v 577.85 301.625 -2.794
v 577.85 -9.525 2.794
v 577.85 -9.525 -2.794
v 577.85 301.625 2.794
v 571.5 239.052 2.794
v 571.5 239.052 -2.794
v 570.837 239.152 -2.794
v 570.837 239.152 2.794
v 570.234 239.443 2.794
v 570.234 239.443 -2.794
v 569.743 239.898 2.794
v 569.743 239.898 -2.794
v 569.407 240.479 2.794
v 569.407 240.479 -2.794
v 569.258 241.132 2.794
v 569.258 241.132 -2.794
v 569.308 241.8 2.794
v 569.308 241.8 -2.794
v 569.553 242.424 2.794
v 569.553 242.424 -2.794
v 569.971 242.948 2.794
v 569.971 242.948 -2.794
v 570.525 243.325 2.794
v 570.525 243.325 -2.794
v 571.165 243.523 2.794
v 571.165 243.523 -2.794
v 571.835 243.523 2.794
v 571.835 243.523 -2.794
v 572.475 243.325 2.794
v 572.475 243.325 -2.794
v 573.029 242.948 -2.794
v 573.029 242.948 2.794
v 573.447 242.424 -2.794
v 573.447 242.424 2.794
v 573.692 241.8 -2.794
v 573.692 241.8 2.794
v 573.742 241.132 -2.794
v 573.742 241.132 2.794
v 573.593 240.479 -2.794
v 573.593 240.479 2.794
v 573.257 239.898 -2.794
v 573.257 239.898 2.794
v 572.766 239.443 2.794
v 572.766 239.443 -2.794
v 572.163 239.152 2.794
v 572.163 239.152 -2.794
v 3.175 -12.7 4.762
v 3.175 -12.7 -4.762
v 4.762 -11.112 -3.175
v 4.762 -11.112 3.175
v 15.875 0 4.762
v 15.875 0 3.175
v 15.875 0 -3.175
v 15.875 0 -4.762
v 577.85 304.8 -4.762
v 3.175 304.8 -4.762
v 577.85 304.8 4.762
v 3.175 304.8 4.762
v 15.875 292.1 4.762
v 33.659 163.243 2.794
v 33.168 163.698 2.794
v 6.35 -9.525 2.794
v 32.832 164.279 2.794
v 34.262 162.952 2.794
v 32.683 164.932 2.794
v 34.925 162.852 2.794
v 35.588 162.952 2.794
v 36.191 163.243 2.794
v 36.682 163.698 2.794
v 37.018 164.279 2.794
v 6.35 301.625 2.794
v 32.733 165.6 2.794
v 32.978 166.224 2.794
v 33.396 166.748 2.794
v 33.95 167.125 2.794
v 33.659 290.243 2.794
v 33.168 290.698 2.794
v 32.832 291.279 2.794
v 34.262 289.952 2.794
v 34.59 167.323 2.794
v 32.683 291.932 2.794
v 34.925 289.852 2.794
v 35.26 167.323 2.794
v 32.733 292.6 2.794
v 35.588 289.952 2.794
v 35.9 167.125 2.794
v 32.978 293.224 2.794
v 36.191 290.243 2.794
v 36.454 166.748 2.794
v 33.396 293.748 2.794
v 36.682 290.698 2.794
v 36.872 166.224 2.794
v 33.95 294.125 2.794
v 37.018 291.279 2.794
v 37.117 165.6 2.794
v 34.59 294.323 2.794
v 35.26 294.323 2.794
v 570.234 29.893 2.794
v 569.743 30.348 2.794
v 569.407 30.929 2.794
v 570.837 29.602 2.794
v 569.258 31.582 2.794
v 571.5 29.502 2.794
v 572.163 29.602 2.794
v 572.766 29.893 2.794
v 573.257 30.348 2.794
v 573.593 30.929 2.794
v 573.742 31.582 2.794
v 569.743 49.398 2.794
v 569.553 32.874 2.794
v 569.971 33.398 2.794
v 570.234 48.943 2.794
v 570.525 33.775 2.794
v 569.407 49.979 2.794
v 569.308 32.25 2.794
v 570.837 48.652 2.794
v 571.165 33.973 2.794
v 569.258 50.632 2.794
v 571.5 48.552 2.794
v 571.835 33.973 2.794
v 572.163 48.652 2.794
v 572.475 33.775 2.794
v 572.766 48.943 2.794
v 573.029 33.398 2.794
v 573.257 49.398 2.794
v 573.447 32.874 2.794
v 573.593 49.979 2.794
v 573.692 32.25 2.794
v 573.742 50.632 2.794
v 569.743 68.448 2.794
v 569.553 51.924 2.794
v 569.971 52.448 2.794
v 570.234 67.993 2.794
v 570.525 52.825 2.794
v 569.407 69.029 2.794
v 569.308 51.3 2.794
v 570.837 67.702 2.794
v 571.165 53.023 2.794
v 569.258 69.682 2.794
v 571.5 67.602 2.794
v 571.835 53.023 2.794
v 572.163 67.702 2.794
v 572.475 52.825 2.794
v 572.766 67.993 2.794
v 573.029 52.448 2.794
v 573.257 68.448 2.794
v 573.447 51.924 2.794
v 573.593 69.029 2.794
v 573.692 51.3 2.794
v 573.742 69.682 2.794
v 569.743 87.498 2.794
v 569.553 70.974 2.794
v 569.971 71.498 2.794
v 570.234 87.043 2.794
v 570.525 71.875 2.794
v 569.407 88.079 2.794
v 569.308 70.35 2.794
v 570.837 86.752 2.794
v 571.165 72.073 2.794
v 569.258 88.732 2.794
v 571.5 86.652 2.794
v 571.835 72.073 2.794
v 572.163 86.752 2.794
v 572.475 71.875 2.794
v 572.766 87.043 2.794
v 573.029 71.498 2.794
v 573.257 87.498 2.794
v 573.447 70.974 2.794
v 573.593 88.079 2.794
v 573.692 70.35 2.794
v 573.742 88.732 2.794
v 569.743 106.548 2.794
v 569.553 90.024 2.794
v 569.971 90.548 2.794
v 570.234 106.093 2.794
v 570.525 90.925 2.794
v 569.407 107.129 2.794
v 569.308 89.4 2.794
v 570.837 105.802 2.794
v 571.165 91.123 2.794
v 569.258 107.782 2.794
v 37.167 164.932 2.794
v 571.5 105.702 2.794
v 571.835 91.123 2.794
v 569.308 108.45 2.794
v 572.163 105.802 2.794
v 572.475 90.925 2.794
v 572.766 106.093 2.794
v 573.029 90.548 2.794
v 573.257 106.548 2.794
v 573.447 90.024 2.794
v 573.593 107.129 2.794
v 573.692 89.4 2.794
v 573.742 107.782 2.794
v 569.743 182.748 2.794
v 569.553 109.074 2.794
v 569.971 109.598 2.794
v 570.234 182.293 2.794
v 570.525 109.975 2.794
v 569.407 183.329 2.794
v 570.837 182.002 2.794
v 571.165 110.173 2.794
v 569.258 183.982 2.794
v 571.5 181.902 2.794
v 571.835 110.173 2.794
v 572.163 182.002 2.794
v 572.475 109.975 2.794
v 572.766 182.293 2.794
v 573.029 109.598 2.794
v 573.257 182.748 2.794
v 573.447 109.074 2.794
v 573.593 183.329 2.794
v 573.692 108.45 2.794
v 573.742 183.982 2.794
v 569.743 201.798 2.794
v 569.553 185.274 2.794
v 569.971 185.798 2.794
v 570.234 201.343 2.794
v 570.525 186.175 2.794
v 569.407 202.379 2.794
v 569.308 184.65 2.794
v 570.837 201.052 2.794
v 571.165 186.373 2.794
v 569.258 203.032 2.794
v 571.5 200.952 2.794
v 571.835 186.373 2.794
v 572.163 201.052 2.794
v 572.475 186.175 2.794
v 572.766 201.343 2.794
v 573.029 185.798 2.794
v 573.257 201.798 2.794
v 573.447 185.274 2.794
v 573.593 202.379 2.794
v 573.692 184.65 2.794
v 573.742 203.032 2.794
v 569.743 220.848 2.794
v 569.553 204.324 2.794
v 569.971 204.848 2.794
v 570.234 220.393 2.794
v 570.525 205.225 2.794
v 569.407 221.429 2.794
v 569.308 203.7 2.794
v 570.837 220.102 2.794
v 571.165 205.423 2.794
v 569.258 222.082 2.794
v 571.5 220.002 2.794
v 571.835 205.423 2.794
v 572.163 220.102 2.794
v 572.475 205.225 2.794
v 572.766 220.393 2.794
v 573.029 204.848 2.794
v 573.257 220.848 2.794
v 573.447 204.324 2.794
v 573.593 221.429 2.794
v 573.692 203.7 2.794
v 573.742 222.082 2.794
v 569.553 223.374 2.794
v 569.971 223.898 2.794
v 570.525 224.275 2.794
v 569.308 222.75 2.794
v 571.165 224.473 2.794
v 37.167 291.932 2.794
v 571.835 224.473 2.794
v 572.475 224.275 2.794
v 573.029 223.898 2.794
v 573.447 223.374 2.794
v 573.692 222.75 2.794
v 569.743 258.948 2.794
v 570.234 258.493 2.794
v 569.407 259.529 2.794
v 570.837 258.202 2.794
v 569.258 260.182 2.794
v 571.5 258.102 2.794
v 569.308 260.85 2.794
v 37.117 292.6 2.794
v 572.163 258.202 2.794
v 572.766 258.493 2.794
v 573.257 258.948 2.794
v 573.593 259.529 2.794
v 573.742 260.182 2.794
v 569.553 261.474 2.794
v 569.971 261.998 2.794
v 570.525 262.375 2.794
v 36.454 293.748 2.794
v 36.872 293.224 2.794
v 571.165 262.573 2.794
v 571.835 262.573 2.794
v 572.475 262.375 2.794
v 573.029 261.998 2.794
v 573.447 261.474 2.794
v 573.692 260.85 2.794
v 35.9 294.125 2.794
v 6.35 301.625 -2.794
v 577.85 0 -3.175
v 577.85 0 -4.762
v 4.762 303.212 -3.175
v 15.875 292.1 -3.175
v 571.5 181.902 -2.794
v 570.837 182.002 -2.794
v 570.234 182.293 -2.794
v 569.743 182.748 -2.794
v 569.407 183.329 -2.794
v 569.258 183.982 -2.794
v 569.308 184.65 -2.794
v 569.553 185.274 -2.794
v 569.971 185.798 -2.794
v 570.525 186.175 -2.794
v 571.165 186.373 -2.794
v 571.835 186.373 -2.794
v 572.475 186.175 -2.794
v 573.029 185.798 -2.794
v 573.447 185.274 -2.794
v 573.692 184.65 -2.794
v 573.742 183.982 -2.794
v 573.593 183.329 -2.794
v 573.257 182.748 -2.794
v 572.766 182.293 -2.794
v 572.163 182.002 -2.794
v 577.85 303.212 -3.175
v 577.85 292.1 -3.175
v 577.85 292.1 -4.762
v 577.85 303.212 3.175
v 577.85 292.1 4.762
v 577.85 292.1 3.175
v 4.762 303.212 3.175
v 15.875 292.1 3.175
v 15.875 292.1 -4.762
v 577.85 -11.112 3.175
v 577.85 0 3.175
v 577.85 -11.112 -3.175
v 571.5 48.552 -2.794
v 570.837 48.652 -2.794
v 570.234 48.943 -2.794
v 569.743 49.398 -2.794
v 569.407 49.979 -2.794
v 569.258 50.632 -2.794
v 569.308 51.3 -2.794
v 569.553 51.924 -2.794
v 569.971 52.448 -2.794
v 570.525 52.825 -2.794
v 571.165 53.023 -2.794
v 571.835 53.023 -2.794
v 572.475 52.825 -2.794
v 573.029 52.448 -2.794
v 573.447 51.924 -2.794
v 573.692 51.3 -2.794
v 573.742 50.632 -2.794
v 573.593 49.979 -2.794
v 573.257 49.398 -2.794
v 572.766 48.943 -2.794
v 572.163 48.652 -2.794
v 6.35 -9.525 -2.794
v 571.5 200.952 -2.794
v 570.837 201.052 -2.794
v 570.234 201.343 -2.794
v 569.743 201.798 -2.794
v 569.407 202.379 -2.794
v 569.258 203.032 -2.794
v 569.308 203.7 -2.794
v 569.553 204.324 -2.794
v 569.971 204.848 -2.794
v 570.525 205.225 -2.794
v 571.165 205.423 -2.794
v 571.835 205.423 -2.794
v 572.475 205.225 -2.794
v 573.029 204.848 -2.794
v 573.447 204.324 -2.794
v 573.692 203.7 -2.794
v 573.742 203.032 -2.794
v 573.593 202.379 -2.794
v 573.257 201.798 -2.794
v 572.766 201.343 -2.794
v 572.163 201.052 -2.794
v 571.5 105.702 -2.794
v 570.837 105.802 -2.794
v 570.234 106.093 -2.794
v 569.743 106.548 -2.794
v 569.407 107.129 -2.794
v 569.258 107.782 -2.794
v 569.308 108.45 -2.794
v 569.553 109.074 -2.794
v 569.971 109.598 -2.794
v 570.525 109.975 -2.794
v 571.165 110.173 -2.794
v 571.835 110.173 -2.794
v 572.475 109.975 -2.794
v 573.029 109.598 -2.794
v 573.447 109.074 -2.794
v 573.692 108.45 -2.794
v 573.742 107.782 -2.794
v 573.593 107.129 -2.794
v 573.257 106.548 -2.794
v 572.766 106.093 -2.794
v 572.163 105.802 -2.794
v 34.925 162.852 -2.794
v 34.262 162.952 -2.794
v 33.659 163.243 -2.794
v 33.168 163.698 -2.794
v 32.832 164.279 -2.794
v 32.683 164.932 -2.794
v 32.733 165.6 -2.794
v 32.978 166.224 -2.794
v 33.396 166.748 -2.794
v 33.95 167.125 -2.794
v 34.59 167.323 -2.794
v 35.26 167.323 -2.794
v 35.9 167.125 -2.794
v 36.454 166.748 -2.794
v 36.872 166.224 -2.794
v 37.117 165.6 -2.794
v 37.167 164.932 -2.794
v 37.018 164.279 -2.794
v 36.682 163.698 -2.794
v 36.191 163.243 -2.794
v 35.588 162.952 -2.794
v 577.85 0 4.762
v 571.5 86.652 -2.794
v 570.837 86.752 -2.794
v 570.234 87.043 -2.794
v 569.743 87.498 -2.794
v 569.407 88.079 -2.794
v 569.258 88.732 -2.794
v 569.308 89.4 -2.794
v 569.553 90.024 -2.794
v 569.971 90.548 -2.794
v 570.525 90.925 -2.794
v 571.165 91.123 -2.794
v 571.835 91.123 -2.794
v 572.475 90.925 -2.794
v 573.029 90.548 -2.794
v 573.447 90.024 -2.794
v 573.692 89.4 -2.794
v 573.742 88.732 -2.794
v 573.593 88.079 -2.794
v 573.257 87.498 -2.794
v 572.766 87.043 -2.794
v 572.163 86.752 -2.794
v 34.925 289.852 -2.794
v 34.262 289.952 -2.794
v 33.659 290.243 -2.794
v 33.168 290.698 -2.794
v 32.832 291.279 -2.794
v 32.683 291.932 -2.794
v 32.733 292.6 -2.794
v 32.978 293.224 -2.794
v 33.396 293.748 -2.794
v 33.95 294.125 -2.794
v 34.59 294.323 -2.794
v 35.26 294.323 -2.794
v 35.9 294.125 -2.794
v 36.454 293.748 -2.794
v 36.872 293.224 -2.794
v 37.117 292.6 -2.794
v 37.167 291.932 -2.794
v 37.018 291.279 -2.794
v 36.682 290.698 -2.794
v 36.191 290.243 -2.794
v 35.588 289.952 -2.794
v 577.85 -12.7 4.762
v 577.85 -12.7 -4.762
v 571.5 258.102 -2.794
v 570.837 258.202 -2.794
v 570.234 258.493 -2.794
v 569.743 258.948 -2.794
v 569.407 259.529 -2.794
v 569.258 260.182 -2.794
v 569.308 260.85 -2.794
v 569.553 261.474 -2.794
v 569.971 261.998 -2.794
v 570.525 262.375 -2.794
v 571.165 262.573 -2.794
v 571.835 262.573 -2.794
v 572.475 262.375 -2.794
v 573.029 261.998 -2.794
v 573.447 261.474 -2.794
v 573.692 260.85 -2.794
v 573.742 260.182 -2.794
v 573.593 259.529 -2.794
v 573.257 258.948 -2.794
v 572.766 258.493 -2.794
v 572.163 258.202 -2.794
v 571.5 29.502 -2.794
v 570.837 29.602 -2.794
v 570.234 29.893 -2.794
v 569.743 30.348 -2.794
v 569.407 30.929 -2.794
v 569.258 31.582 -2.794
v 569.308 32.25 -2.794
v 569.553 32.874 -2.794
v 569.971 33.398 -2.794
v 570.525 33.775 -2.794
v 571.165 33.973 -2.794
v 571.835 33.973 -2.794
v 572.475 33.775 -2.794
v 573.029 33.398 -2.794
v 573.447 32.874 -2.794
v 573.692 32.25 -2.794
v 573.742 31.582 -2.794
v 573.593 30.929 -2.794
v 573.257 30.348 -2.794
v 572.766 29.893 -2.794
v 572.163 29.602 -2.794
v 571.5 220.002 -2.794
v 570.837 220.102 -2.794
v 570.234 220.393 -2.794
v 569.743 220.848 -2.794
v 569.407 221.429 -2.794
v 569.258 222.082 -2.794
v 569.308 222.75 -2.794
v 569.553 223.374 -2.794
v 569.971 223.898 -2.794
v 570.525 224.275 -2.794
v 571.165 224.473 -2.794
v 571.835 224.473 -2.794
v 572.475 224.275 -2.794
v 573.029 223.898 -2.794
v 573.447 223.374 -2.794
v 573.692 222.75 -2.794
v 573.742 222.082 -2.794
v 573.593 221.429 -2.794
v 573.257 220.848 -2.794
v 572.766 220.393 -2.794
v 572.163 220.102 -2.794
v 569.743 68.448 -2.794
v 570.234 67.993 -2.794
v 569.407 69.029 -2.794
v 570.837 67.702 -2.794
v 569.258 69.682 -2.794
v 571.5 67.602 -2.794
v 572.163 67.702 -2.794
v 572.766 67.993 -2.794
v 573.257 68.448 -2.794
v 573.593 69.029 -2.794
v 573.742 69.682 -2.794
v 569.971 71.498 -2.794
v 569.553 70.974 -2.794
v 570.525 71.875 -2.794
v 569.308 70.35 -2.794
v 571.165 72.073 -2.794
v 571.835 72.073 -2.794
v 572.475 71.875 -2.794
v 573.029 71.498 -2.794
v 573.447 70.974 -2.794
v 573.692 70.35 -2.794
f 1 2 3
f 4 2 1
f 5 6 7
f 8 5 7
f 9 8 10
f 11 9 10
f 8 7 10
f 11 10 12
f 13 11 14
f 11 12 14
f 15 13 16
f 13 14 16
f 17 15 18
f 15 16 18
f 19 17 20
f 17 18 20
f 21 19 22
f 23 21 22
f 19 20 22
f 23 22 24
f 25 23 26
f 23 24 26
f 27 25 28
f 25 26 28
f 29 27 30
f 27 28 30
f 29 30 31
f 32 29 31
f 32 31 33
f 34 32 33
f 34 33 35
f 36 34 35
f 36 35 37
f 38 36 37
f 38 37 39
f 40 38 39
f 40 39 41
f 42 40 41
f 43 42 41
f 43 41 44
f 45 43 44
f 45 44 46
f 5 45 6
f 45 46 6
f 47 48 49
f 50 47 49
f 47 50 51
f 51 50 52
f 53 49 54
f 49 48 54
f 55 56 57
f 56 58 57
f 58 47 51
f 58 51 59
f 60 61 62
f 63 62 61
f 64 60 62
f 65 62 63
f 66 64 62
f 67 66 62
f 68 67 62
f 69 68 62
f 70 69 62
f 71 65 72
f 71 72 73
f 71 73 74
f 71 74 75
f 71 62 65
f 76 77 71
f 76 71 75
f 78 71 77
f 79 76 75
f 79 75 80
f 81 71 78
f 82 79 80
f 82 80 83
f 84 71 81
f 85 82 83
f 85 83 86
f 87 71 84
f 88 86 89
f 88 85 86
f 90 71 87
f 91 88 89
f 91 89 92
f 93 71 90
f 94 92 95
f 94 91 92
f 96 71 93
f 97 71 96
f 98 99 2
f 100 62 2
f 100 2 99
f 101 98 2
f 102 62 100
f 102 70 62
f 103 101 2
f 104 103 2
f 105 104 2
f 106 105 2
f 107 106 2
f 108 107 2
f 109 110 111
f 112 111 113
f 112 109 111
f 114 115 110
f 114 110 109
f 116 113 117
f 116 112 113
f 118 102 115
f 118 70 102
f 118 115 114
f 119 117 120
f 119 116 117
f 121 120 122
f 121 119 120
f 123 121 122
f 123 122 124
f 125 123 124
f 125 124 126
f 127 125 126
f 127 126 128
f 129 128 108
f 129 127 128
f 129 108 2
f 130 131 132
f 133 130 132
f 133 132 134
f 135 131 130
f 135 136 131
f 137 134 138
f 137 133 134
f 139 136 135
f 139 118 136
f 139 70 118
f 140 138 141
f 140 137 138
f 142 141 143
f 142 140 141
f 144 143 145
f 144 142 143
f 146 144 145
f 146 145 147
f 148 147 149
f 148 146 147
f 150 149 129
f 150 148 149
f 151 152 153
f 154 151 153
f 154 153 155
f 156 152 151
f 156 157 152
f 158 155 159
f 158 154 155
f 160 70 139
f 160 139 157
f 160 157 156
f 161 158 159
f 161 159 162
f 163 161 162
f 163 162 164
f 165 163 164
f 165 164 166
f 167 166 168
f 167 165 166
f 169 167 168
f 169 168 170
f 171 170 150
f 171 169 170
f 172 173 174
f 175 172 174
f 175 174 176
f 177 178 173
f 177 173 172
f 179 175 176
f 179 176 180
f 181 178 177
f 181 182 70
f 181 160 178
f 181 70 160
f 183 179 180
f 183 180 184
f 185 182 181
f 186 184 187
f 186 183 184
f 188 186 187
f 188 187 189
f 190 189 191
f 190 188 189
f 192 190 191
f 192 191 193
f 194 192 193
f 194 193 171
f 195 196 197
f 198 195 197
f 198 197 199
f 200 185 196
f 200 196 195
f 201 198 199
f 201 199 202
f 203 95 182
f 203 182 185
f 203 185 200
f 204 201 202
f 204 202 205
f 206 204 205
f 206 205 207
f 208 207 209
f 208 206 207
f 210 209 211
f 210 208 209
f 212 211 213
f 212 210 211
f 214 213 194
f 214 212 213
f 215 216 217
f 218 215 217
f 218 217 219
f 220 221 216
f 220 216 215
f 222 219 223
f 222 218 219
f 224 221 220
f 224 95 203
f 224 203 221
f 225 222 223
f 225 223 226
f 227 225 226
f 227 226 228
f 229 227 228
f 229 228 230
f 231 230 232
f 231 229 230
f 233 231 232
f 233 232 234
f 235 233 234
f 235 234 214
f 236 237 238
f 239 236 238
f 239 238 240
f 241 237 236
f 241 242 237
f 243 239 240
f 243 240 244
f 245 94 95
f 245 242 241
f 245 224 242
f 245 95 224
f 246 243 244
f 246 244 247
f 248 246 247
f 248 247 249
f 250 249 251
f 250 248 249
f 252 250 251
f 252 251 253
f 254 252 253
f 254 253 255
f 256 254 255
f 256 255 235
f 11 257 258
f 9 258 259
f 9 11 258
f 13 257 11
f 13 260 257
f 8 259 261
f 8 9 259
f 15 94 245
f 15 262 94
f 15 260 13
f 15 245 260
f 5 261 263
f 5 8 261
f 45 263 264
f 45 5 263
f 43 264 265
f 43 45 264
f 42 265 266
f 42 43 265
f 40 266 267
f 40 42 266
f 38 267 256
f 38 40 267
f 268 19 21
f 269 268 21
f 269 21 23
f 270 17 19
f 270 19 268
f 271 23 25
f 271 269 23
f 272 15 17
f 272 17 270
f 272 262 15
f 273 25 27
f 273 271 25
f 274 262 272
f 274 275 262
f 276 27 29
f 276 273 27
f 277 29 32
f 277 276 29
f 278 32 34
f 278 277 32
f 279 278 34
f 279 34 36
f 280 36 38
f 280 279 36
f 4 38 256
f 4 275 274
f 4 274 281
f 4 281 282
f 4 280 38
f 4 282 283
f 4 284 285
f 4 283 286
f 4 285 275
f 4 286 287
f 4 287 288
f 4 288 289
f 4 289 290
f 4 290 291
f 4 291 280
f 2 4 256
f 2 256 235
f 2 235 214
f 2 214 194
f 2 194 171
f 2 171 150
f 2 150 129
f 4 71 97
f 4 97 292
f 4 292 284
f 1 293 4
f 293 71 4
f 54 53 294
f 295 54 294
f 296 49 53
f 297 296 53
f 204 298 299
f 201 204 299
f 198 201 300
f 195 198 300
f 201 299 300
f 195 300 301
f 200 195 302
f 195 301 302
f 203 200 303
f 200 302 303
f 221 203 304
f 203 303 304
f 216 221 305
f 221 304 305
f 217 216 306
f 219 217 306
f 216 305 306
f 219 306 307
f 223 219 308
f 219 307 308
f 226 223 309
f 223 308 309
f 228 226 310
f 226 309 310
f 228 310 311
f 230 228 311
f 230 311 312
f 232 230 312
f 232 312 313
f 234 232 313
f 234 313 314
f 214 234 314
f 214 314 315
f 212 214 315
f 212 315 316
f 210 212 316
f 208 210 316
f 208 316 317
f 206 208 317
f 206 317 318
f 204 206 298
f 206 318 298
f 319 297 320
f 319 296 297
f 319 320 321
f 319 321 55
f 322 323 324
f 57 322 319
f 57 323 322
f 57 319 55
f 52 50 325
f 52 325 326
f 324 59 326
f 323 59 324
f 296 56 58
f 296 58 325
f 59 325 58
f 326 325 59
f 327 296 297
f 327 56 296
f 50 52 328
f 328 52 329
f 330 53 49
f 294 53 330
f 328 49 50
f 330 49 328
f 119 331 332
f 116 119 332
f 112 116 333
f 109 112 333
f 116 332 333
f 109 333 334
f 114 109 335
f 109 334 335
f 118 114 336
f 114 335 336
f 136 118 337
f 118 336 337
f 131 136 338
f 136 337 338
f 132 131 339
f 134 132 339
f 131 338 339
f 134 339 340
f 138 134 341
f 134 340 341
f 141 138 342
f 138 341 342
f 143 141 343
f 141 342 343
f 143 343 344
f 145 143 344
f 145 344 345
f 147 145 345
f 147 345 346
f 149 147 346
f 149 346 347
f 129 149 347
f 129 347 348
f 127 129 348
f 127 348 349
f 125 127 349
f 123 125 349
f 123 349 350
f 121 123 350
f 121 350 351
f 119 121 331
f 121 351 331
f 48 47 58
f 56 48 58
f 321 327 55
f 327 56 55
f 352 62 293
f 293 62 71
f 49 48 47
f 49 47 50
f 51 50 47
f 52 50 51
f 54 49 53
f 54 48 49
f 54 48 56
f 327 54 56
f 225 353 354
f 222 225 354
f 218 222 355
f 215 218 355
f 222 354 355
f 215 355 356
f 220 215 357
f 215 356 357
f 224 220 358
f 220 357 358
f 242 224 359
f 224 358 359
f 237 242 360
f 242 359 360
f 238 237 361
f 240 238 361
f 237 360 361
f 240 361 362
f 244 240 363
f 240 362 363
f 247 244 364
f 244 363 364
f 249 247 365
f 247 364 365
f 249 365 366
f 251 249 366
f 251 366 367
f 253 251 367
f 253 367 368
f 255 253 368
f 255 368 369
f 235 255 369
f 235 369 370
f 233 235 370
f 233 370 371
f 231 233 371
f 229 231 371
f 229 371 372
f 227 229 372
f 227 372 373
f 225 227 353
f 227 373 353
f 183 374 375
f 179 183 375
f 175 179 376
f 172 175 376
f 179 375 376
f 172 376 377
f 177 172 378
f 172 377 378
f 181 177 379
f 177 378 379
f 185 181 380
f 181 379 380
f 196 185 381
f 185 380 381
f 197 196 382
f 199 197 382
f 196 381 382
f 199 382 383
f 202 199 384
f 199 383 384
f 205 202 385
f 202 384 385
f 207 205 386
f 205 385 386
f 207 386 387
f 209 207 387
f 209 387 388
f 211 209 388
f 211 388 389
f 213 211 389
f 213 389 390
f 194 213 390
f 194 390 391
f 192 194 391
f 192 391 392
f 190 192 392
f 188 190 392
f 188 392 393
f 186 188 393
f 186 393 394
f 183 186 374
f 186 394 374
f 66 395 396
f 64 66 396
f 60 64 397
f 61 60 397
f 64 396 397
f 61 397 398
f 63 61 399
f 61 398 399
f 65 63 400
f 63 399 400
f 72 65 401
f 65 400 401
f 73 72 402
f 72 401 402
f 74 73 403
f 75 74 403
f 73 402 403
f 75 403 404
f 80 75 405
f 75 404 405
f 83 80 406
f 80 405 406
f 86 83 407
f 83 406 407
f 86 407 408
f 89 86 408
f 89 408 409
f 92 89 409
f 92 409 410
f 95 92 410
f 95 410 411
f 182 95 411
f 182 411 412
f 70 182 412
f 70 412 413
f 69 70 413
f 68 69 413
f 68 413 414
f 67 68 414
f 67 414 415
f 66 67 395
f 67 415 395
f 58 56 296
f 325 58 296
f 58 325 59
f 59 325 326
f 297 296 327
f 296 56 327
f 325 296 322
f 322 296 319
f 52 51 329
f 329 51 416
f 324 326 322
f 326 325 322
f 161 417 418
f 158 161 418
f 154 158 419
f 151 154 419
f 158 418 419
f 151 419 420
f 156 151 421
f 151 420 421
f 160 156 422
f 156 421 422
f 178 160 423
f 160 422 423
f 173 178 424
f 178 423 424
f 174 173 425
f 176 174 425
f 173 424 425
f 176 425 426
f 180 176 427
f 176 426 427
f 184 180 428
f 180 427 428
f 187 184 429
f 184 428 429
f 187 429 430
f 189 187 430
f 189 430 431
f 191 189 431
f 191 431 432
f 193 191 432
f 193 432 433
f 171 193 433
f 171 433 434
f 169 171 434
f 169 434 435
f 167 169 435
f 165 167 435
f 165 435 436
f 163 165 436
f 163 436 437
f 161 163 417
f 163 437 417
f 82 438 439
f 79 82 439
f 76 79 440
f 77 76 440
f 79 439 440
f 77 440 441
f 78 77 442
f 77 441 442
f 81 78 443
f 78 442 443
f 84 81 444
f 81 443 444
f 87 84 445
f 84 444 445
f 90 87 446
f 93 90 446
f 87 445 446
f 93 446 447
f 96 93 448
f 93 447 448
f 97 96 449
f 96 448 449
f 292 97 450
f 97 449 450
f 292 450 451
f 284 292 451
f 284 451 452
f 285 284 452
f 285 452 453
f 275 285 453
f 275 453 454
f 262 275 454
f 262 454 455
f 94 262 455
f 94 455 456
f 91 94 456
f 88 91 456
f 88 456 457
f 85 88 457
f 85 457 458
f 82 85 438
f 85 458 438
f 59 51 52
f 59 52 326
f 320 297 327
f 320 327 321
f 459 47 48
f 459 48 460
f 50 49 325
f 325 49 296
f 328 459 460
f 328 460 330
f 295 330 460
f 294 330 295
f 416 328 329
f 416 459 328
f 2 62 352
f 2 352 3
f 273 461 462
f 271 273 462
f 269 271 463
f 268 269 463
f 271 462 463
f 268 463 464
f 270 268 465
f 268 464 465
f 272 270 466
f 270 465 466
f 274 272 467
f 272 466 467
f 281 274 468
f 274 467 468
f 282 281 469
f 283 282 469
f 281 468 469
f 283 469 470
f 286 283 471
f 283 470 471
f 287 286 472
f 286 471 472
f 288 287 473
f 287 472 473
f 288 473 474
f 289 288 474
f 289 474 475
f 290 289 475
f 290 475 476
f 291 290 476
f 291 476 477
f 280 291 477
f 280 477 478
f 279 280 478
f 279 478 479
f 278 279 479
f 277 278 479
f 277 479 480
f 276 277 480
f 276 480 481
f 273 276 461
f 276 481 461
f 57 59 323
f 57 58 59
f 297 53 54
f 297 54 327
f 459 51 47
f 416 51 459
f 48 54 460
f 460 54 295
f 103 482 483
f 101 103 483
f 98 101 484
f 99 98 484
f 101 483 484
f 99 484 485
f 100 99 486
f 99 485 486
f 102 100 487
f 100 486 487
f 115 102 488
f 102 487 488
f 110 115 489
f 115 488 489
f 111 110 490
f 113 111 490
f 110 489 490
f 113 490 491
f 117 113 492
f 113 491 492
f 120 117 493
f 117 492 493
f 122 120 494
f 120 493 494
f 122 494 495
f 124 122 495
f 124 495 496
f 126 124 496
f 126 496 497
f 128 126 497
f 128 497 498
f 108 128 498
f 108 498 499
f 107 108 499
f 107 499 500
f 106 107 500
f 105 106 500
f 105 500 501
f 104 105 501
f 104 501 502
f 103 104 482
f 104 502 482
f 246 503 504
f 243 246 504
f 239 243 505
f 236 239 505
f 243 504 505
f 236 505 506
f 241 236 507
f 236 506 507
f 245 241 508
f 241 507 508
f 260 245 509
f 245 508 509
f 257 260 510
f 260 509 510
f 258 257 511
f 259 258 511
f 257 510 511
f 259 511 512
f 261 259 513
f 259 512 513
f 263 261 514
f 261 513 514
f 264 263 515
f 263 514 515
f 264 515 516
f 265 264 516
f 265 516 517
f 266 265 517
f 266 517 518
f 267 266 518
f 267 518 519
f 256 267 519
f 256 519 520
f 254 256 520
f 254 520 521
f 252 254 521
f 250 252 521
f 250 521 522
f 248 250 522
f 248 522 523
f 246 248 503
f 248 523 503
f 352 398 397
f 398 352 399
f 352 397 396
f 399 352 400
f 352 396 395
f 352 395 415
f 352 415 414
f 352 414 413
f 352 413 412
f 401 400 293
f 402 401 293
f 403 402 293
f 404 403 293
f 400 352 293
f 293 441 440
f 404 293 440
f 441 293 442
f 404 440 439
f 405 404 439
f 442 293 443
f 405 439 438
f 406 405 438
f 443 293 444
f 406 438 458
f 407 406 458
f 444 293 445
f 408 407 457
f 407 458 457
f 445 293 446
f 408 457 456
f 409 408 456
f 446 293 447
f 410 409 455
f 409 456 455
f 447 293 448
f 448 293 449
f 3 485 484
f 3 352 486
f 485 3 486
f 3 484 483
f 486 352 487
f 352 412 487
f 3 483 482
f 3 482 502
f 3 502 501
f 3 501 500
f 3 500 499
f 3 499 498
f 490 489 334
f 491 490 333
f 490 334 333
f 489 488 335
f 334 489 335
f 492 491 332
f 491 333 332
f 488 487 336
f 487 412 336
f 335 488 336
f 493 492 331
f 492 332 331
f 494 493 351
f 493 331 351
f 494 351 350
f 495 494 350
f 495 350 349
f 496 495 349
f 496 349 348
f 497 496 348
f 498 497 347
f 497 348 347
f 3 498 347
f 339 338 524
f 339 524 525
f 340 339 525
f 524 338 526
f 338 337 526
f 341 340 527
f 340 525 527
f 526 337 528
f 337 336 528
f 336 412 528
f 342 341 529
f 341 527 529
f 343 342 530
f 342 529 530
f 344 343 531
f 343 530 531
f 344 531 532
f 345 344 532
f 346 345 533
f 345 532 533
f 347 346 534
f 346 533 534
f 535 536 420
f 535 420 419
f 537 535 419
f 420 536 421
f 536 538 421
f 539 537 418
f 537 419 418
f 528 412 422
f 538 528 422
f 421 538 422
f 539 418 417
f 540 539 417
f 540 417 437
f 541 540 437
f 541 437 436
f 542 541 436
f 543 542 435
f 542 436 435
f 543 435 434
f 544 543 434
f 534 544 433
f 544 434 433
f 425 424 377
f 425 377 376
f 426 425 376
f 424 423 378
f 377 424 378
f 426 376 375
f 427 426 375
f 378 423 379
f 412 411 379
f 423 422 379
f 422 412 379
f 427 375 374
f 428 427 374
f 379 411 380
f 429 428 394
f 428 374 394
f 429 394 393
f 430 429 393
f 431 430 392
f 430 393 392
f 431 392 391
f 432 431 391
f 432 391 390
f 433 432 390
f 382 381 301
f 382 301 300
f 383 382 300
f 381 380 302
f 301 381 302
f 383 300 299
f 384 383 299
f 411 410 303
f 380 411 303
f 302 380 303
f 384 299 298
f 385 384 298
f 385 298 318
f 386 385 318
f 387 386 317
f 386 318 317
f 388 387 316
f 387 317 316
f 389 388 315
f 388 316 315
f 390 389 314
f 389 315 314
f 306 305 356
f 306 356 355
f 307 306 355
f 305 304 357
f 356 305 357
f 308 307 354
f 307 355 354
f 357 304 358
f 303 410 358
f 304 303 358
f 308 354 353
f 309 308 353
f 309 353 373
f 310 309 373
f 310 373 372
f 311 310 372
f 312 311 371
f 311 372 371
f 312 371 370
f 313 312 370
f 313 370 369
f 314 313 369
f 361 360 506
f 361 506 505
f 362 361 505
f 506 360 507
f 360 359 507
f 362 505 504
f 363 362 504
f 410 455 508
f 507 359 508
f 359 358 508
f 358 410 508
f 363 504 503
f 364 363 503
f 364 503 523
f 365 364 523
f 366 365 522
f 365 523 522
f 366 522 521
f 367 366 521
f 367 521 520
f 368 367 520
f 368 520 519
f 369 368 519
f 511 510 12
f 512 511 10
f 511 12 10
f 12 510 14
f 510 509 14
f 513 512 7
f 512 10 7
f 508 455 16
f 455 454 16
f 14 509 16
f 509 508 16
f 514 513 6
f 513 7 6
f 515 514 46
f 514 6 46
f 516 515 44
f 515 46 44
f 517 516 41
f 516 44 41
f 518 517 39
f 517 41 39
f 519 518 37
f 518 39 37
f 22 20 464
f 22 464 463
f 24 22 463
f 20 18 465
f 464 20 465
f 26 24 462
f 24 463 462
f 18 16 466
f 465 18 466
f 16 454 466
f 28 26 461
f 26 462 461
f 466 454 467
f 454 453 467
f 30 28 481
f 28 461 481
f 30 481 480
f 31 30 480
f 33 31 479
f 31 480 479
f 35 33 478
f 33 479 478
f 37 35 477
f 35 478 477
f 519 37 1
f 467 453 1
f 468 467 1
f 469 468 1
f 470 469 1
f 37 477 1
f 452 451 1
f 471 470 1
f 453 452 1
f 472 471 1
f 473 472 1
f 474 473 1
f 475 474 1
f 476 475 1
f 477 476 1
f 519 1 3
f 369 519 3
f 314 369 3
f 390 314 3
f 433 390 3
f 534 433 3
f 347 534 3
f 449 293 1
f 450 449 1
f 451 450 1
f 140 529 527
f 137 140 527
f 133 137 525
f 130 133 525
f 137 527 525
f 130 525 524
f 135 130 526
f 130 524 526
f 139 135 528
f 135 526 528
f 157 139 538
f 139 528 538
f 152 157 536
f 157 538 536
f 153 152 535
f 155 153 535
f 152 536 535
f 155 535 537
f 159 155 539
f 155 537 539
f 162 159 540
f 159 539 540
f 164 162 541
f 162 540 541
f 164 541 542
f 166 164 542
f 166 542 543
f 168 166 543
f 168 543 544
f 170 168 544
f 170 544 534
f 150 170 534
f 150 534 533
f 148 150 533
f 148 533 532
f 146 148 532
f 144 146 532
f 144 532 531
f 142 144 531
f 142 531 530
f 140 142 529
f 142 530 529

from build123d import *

# Parameters (mm, degrees)
SKETCH2_W                             = 574.675
SKETCH2_H                             = 317.5
FRAME_OUTER_DIMENSIONS_DEPTH          = 4.7625
SKETCH3_W                             = 561.975
SKETCH3_H                             = 292.1
FRAME_INNER_DIMENSIONS_DEPTH          = 654.379206989
FRAME_PROFILE_DEPTH                   = 3.175
FRAME_PROFILE_DEPTH_BACK              = 3.175
SKETCH4_W                             = 573.0875
SKETCH4_H                             = 314.325
FRAME_SECTION_SPLIT_SURFACE_1_1_BACK  = 657.619
FRAME_SECTION_SPLIT_SURFACE_1_1_DEPTH = 1315.238
FRAME_SECTION_SPLIT_SURFACE_1_2_BACK  = 657.619
FRAME_SECTION_SPLIT_SURFACE_1_2_DEPTH = 1315.238
FRAME_SECTION_SPLIT_SURFACE_2_3_BACK  = 657.619
FRAME_SECTION_SPLIT_SURFACE_2_3_DEPTH = 1315.238
FRAME_SECTION_SPLIT_SURFACE_2_4_BACK  = 657.619
FRAME_SECTION_SPLIT_SURFACE_2_4_DEPTH = 1315.238
SKETCH5_W                             = 571.5
SKETCH5_H                             = 311.15
DOOR_PANEL_DEPTH                      = 2.794
SKETCH9_W                             = 2.2479
SKETCH9_H                             = 7.5565
F_8_CLEARANCE_HOLE1_AT_2_COUNT        = 2
F_8_CLEARANCE_HOLE1_AT_2_PITCH        = 19.05
F_8_CLEARANCE_HOLE1_AT_3_COUNT        = 2
F_8_CLEARANCE_HOLE1_AT_3_PITCH        = 38.1
F_8_CLEARANCE_HOLE1_AT_4_COUNT        = 2
F_8_CLEARANCE_HOLE1_AT_4_PITCH        = 57.15
F_8_CLEARANCE_HOLE1_AT_5_COUNT        = 2
F_8_CLEARANCE_HOLE1_AT_5_PITCH        = 76.2
F_8_CLEARANCE_HOLE1_AT_6_COUNT        = 2
F_8_CLEARANCE_HOLE1_AT_6_PITCH        = 171.45
F_8_CLEARANCE_HOLE1_AT_7_COUNT        = 2
F_8_CLEARANCE_HOLE1_AT_7_PITCH        = 190.5
F_8_CLEARANCE_HOLE1_AT_8_COUNT        = 2
F_8_CLEARANCE_HOLE1_AT_8_PITCH        = 209.55
F_8_CLEARANCE_HOLE1_AT_9_COUNT        = 2
F_8_CLEARANCE_HOLE1_AT_9_PITCH        = 228.6
F_8_CLEARANCE_HOLE1_AT_10_COUNT       = 2
F_8_CLEARANCE_HOLE1_AT_10_PITCH       = 152.4
SKETCH12_W                            = 2.2479
SKETCH12_H                            = 7.5565
F_8_CLEARANCE_HOLE2_AT_2_COUNT        = 2
F_8_CLEARANCE_HOLE2_AT_2_PITCH        = 127


with BuildPart() as part:
    # Sketch2 → Frame outer dimensions (new, symmetric)
    with BuildSketch(Plane.XY):
        with Locations((290.5125, 146.05)):
            Rectangle(SKETCH2_W, SKETCH2_H)
    extrude(amount=FRAME_OUTER_DIMENSIONS_DEPTH, both=True)

    # Sketch3 → Frame inner dimensions (cut, through all)
    with BuildSketch(Plane.XY.offset(4.7625)):
        with Locations((296.8625, 146.05)):
            Rectangle(SKETCH3_W, SKETCH3_H)
    extrude(amount=-FRAME_INNER_DIMENSIONS_DEPTH, mode=Mode.SUBTRACT)

    # Sketch4 → Frame profile (cut, two sides: drawn at the far end of the back side and taken through both)
    with BuildSketch(Plane.XY.offset(-FRAME_PROFILE_DEPTH_BACK)):
        with Locations((291.30625, 146.05)):
            Rectangle(SKETCH4_W, SKETCH4_H)
    extrude(amount=FRAME_PROFILE_DEPTH + FRAME_PROFILE_DEPTH_BACK, mode=Mode.SUBTRACT)


with BuildPart() as body_2:
    # Frame section split: the piece behind the surface
    add(part.part)
    # Frame section split surface 1: a surface, the sketch's curves swept straight by 1315.238 mm
    with BuildLine(Plane.XY.offset(4.7625).offset(-FRAME_SECTION_SPLIT_SURFACE_1_1_BACK), mode=Mode.PRIVATE) as frame_section_split_surface_1_1_path:
        Line((3.175, 304.8), (15.875, 292.1))
    frame_section_split_surface_1_1 = Shell.extrude(frame_section_split_surface_1_1_path.wire(), (0 * FRAME_SECTION_SPLIT_SURFACE_1_1_DEPTH, 0 * FRAME_SECTION_SPLIT_SURFACE_1_1_DEPTH, 1 * FRAME_SECTION_SPLIT_SURFACE_1_1_DEPTH))
    split(bisect_by=frame_section_split_surface_1_1, keep=Keep.BOTTOM)


with BuildPart() as part_1:
    add(part.part)

    # Frame section split: split by a surface, the side it looks to stays
    # Frame section split surface 1: a surface, the sketch's curves swept straight by 1315.238 mm
    with BuildLine(Plane.XY.offset(4.7625).offset(-FRAME_SECTION_SPLIT_SURFACE_1_2_BACK), mode=Mode.PRIVATE) as frame_section_split_surface_1_2_path:
        Line((3.175, 304.8), (15.875, 292.1))
    frame_section_split_surface_1_2 = Shell.extrude(frame_section_split_surface_1_2_path.wire(), (0 * FRAME_SECTION_SPLIT_SURFACE_1_2_DEPTH, 0 * FRAME_SECTION_SPLIT_SURFACE_1_2_DEPTH, 1 * FRAME_SECTION_SPLIT_SURFACE_1_2_DEPTH))
    split(bisect_by=frame_section_split_surface_1_2, keep=Keep.TOP)


with BuildPart() as body_3:
    # Frame section split 2 body 2: the piece behind the surface
    add(body_2.part)
    # Frame section split surface 2: a surface, the sketch's curves swept straight by 1315.238 mm
    with BuildLine(Plane.XY.offset(4.7625).offset(-FRAME_SECTION_SPLIT_SURFACE_2_3_BACK), mode=Mode.PRIVATE) as frame_section_split_surface_2_3_path:
        Line((3.175, -12.7), (15.875, 0))
    frame_section_split_surface_2_3 = Shell.extrude(frame_section_split_surface_2_3_path.wire(), (0 * FRAME_SECTION_SPLIT_SURFACE_2_3_DEPTH, 0 * FRAME_SECTION_SPLIT_SURFACE_2_3_DEPTH, 1 * FRAME_SECTION_SPLIT_SURFACE_2_3_DEPTH))
    split(bisect_by=frame_section_split_surface_2_3, keep=Keep.BOTTOM)


with BuildPart() as body_2_1:
    add(body_2.part)

    # Frame section split 2 body 2: split by a surface, the side it looks to stays
    # Frame section split surface 2: a surface, the sketch's curves swept straight by 1315.238 mm
    with BuildLine(Plane.XY.offset(4.7625).offset(-FRAME_SECTION_SPLIT_SURFACE_2_4_BACK), mode=Mode.PRIVATE) as frame_section_split_surface_2_4_path:
        Line((3.175, -12.7), (15.875, 0))
    frame_section_split_surface_2_4 = Shell.extrude(frame_section_split_surface_2_4_path.wire(), (0 * FRAME_SECTION_SPLIT_SURFACE_2_4_DEPTH, 0 * FRAME_SECTION_SPLIT_SURFACE_2_4_DEPTH, 1 * FRAME_SECTION_SPLIT_SURFACE_2_4_DEPTH))
    split(bisect_by=frame_section_split_surface_2_4, keep=Keep.TOP)


with BuildPart() as body_4:
    # Sketch5 → Door panel (new, symmetric)
    with BuildSketch(Plane.XY):
        with Locations((292.1, 146.05)):
            Rectangle(SKETCH5_W, SKETCH5_H)
    extrude(amount=DOOR_PANEL_DEPTH, both=True)

    # Sketch9 → #8 Clearance Hole1 (revolve, cut)
    with BuildSketch(Plane(origin=(571.5, 31.75, 2.794), x_dir=(0, -1, 0), z_dir=(1, 0, 0))):
        with Locations((1.12395, 3.77825)):
            Rectangle(SKETCH9_W, SKETCH9_H)
    f_8_clearance_hole1 = revolve(axis=Axis((571.5, 31.75, 9.144), (0, 0, -1)), mode=Mode.SUBTRACT)

    # #8 Clearance Hole1 at 2: #8 Clearance Hole1 ×2
    with Locations(*[(0, i * F_8_CLEARANCE_HOLE1_AT_2_PITCH, 0) for i in range(1, F_8_CLEARANCE_HOLE1_AT_2_COUNT)]):
        add(f_8_clearance_hole1, mode=Mode.SUBTRACT)

    # #8 Clearance Hole1 at 3: #8 Clearance Hole1 ×2
    with Locations(*[(0, i * F_8_CLEARANCE_HOLE1_AT_3_PITCH, 0) for i in range(1, F_8_CLEARANCE_HOLE1_AT_3_COUNT)]):
        add(f_8_clearance_hole1, mode=Mode.SUBTRACT)

    # #8 Clearance Hole1 at 4: #8 Clearance Hole1 ×2
    with Locations(*[(0, i * F_8_CLEARANCE_HOLE1_AT_4_PITCH, 0) for i in range(1, F_8_CLEARANCE_HOLE1_AT_4_COUNT)]):
        add(f_8_clearance_hole1, mode=Mode.SUBTRACT)

    # #8 Clearance Hole1 at 5: #8 Clearance Hole1 ×2
    with Locations(*[(0, i * F_8_CLEARANCE_HOLE1_AT_5_PITCH, 0) for i in range(1, F_8_CLEARANCE_HOLE1_AT_5_COUNT)]):
        add(f_8_clearance_hole1, mode=Mode.SUBTRACT)

    # #8 Clearance Hole1 at 6: #8 Clearance Hole1 ×2
    with Locations(*[(0, i * F_8_CLEARANCE_HOLE1_AT_6_PITCH, 0) for i in range(1, F_8_CLEARANCE_HOLE1_AT_6_COUNT)]):
        add(f_8_clearance_hole1, mode=Mode.SUBTRACT)

    # #8 Clearance Hole1 at 7: #8 Clearance Hole1 ×2
    with Locations(*[(0, i * F_8_CLEARANCE_HOLE1_AT_7_PITCH, 0) for i in range(1, F_8_CLEARANCE_HOLE1_AT_7_COUNT)]):
        add(f_8_clearance_hole1, mode=Mode.SUBTRACT)

    # #8 Clearance Hole1 at 8: #8 Clearance Hole1 ×2
    with Locations(*[(0, i * F_8_CLEARANCE_HOLE1_AT_8_PITCH, 0) for i in range(1, F_8_CLEARANCE_HOLE1_AT_8_COUNT)]):
        add(f_8_clearance_hole1, mode=Mode.SUBTRACT)

    # #8 Clearance Hole1 at 9: #8 Clearance Hole1 ×2
    with Locations(*[(0, i * F_8_CLEARANCE_HOLE1_AT_9_PITCH, 0) for i in range(1, F_8_CLEARANCE_HOLE1_AT_9_COUNT)]):
        add(f_8_clearance_hole1, mode=Mode.SUBTRACT)

    # #8 Clearance Hole1 at 10: #8 Clearance Hole1 ×2
    with Locations(*[(0, i * F_8_CLEARANCE_HOLE1_AT_10_PITCH, 0) for i in range(1, F_8_CLEARANCE_HOLE1_AT_10_COUNT)]):
        add(f_8_clearance_hole1, mode=Mode.SUBTRACT)

    # Sketch12 → #8 Clearance Hole2 (revolve, cut)
    with BuildSketch(Plane(origin=(34.925, 292.1, 2.794), x_dir=(0, -1, 0), z_dir=(1, 0, 0))):
        with Locations((1.12395, 3.77825)):
            Rectangle(SKETCH12_W, SKETCH12_H)
    f_8_clearance_hole2 = revolve(axis=Axis((34.925, 292.1, 9.144), (0, 0, -1)), mode=Mode.SUBTRACT)

    # #8 Clearance Hole2 at 2: #8 Clearance Hole2 ×2
    with Locations(*[(0, -i * F_8_CLEARANCE_HOLE2_AT_2_PITCH, 0) for i in range(1, F_8_CLEARANCE_HOLE2_AT_2_COUNT)]):
        add(f_8_clearance_hole2, mode=Mode.SUBTRACT)


with BuildPart() as body_5:
    # Mirror1: mirrored copy
    add(part_1.part.mirror(Plane(origin=(0, 0, 0), x_dir=(0, 0, 1), z_dir=(1, 0, 0))))


with BuildPart() as body_6:
    # Mirror1 2: mirrored copy
    add(body_2_1.part.mirror(Plane(origin=(0, 0, 0), x_dir=(0, 0, 1), z_dir=(1, 0, 0))))


with BuildPart() as body_7:
    # Mirror1 3: mirrored copy
    add(body_3.part.mirror(Plane(origin=(0, 0, 0), x_dir=(0, 0, 1), z_dir=(1, 0, 0))))


with BuildPart() as body_8:
    # Mirror1 4: mirrored copy
    add(body_4.part.mirror(Plane(origin=(0, 0, 0), x_dir=(0, 0, 1), z_dir=(1, 0, 0))))


solid = Compound([part_1.part, body_3.part, body_2_1.part, body_4.part])
